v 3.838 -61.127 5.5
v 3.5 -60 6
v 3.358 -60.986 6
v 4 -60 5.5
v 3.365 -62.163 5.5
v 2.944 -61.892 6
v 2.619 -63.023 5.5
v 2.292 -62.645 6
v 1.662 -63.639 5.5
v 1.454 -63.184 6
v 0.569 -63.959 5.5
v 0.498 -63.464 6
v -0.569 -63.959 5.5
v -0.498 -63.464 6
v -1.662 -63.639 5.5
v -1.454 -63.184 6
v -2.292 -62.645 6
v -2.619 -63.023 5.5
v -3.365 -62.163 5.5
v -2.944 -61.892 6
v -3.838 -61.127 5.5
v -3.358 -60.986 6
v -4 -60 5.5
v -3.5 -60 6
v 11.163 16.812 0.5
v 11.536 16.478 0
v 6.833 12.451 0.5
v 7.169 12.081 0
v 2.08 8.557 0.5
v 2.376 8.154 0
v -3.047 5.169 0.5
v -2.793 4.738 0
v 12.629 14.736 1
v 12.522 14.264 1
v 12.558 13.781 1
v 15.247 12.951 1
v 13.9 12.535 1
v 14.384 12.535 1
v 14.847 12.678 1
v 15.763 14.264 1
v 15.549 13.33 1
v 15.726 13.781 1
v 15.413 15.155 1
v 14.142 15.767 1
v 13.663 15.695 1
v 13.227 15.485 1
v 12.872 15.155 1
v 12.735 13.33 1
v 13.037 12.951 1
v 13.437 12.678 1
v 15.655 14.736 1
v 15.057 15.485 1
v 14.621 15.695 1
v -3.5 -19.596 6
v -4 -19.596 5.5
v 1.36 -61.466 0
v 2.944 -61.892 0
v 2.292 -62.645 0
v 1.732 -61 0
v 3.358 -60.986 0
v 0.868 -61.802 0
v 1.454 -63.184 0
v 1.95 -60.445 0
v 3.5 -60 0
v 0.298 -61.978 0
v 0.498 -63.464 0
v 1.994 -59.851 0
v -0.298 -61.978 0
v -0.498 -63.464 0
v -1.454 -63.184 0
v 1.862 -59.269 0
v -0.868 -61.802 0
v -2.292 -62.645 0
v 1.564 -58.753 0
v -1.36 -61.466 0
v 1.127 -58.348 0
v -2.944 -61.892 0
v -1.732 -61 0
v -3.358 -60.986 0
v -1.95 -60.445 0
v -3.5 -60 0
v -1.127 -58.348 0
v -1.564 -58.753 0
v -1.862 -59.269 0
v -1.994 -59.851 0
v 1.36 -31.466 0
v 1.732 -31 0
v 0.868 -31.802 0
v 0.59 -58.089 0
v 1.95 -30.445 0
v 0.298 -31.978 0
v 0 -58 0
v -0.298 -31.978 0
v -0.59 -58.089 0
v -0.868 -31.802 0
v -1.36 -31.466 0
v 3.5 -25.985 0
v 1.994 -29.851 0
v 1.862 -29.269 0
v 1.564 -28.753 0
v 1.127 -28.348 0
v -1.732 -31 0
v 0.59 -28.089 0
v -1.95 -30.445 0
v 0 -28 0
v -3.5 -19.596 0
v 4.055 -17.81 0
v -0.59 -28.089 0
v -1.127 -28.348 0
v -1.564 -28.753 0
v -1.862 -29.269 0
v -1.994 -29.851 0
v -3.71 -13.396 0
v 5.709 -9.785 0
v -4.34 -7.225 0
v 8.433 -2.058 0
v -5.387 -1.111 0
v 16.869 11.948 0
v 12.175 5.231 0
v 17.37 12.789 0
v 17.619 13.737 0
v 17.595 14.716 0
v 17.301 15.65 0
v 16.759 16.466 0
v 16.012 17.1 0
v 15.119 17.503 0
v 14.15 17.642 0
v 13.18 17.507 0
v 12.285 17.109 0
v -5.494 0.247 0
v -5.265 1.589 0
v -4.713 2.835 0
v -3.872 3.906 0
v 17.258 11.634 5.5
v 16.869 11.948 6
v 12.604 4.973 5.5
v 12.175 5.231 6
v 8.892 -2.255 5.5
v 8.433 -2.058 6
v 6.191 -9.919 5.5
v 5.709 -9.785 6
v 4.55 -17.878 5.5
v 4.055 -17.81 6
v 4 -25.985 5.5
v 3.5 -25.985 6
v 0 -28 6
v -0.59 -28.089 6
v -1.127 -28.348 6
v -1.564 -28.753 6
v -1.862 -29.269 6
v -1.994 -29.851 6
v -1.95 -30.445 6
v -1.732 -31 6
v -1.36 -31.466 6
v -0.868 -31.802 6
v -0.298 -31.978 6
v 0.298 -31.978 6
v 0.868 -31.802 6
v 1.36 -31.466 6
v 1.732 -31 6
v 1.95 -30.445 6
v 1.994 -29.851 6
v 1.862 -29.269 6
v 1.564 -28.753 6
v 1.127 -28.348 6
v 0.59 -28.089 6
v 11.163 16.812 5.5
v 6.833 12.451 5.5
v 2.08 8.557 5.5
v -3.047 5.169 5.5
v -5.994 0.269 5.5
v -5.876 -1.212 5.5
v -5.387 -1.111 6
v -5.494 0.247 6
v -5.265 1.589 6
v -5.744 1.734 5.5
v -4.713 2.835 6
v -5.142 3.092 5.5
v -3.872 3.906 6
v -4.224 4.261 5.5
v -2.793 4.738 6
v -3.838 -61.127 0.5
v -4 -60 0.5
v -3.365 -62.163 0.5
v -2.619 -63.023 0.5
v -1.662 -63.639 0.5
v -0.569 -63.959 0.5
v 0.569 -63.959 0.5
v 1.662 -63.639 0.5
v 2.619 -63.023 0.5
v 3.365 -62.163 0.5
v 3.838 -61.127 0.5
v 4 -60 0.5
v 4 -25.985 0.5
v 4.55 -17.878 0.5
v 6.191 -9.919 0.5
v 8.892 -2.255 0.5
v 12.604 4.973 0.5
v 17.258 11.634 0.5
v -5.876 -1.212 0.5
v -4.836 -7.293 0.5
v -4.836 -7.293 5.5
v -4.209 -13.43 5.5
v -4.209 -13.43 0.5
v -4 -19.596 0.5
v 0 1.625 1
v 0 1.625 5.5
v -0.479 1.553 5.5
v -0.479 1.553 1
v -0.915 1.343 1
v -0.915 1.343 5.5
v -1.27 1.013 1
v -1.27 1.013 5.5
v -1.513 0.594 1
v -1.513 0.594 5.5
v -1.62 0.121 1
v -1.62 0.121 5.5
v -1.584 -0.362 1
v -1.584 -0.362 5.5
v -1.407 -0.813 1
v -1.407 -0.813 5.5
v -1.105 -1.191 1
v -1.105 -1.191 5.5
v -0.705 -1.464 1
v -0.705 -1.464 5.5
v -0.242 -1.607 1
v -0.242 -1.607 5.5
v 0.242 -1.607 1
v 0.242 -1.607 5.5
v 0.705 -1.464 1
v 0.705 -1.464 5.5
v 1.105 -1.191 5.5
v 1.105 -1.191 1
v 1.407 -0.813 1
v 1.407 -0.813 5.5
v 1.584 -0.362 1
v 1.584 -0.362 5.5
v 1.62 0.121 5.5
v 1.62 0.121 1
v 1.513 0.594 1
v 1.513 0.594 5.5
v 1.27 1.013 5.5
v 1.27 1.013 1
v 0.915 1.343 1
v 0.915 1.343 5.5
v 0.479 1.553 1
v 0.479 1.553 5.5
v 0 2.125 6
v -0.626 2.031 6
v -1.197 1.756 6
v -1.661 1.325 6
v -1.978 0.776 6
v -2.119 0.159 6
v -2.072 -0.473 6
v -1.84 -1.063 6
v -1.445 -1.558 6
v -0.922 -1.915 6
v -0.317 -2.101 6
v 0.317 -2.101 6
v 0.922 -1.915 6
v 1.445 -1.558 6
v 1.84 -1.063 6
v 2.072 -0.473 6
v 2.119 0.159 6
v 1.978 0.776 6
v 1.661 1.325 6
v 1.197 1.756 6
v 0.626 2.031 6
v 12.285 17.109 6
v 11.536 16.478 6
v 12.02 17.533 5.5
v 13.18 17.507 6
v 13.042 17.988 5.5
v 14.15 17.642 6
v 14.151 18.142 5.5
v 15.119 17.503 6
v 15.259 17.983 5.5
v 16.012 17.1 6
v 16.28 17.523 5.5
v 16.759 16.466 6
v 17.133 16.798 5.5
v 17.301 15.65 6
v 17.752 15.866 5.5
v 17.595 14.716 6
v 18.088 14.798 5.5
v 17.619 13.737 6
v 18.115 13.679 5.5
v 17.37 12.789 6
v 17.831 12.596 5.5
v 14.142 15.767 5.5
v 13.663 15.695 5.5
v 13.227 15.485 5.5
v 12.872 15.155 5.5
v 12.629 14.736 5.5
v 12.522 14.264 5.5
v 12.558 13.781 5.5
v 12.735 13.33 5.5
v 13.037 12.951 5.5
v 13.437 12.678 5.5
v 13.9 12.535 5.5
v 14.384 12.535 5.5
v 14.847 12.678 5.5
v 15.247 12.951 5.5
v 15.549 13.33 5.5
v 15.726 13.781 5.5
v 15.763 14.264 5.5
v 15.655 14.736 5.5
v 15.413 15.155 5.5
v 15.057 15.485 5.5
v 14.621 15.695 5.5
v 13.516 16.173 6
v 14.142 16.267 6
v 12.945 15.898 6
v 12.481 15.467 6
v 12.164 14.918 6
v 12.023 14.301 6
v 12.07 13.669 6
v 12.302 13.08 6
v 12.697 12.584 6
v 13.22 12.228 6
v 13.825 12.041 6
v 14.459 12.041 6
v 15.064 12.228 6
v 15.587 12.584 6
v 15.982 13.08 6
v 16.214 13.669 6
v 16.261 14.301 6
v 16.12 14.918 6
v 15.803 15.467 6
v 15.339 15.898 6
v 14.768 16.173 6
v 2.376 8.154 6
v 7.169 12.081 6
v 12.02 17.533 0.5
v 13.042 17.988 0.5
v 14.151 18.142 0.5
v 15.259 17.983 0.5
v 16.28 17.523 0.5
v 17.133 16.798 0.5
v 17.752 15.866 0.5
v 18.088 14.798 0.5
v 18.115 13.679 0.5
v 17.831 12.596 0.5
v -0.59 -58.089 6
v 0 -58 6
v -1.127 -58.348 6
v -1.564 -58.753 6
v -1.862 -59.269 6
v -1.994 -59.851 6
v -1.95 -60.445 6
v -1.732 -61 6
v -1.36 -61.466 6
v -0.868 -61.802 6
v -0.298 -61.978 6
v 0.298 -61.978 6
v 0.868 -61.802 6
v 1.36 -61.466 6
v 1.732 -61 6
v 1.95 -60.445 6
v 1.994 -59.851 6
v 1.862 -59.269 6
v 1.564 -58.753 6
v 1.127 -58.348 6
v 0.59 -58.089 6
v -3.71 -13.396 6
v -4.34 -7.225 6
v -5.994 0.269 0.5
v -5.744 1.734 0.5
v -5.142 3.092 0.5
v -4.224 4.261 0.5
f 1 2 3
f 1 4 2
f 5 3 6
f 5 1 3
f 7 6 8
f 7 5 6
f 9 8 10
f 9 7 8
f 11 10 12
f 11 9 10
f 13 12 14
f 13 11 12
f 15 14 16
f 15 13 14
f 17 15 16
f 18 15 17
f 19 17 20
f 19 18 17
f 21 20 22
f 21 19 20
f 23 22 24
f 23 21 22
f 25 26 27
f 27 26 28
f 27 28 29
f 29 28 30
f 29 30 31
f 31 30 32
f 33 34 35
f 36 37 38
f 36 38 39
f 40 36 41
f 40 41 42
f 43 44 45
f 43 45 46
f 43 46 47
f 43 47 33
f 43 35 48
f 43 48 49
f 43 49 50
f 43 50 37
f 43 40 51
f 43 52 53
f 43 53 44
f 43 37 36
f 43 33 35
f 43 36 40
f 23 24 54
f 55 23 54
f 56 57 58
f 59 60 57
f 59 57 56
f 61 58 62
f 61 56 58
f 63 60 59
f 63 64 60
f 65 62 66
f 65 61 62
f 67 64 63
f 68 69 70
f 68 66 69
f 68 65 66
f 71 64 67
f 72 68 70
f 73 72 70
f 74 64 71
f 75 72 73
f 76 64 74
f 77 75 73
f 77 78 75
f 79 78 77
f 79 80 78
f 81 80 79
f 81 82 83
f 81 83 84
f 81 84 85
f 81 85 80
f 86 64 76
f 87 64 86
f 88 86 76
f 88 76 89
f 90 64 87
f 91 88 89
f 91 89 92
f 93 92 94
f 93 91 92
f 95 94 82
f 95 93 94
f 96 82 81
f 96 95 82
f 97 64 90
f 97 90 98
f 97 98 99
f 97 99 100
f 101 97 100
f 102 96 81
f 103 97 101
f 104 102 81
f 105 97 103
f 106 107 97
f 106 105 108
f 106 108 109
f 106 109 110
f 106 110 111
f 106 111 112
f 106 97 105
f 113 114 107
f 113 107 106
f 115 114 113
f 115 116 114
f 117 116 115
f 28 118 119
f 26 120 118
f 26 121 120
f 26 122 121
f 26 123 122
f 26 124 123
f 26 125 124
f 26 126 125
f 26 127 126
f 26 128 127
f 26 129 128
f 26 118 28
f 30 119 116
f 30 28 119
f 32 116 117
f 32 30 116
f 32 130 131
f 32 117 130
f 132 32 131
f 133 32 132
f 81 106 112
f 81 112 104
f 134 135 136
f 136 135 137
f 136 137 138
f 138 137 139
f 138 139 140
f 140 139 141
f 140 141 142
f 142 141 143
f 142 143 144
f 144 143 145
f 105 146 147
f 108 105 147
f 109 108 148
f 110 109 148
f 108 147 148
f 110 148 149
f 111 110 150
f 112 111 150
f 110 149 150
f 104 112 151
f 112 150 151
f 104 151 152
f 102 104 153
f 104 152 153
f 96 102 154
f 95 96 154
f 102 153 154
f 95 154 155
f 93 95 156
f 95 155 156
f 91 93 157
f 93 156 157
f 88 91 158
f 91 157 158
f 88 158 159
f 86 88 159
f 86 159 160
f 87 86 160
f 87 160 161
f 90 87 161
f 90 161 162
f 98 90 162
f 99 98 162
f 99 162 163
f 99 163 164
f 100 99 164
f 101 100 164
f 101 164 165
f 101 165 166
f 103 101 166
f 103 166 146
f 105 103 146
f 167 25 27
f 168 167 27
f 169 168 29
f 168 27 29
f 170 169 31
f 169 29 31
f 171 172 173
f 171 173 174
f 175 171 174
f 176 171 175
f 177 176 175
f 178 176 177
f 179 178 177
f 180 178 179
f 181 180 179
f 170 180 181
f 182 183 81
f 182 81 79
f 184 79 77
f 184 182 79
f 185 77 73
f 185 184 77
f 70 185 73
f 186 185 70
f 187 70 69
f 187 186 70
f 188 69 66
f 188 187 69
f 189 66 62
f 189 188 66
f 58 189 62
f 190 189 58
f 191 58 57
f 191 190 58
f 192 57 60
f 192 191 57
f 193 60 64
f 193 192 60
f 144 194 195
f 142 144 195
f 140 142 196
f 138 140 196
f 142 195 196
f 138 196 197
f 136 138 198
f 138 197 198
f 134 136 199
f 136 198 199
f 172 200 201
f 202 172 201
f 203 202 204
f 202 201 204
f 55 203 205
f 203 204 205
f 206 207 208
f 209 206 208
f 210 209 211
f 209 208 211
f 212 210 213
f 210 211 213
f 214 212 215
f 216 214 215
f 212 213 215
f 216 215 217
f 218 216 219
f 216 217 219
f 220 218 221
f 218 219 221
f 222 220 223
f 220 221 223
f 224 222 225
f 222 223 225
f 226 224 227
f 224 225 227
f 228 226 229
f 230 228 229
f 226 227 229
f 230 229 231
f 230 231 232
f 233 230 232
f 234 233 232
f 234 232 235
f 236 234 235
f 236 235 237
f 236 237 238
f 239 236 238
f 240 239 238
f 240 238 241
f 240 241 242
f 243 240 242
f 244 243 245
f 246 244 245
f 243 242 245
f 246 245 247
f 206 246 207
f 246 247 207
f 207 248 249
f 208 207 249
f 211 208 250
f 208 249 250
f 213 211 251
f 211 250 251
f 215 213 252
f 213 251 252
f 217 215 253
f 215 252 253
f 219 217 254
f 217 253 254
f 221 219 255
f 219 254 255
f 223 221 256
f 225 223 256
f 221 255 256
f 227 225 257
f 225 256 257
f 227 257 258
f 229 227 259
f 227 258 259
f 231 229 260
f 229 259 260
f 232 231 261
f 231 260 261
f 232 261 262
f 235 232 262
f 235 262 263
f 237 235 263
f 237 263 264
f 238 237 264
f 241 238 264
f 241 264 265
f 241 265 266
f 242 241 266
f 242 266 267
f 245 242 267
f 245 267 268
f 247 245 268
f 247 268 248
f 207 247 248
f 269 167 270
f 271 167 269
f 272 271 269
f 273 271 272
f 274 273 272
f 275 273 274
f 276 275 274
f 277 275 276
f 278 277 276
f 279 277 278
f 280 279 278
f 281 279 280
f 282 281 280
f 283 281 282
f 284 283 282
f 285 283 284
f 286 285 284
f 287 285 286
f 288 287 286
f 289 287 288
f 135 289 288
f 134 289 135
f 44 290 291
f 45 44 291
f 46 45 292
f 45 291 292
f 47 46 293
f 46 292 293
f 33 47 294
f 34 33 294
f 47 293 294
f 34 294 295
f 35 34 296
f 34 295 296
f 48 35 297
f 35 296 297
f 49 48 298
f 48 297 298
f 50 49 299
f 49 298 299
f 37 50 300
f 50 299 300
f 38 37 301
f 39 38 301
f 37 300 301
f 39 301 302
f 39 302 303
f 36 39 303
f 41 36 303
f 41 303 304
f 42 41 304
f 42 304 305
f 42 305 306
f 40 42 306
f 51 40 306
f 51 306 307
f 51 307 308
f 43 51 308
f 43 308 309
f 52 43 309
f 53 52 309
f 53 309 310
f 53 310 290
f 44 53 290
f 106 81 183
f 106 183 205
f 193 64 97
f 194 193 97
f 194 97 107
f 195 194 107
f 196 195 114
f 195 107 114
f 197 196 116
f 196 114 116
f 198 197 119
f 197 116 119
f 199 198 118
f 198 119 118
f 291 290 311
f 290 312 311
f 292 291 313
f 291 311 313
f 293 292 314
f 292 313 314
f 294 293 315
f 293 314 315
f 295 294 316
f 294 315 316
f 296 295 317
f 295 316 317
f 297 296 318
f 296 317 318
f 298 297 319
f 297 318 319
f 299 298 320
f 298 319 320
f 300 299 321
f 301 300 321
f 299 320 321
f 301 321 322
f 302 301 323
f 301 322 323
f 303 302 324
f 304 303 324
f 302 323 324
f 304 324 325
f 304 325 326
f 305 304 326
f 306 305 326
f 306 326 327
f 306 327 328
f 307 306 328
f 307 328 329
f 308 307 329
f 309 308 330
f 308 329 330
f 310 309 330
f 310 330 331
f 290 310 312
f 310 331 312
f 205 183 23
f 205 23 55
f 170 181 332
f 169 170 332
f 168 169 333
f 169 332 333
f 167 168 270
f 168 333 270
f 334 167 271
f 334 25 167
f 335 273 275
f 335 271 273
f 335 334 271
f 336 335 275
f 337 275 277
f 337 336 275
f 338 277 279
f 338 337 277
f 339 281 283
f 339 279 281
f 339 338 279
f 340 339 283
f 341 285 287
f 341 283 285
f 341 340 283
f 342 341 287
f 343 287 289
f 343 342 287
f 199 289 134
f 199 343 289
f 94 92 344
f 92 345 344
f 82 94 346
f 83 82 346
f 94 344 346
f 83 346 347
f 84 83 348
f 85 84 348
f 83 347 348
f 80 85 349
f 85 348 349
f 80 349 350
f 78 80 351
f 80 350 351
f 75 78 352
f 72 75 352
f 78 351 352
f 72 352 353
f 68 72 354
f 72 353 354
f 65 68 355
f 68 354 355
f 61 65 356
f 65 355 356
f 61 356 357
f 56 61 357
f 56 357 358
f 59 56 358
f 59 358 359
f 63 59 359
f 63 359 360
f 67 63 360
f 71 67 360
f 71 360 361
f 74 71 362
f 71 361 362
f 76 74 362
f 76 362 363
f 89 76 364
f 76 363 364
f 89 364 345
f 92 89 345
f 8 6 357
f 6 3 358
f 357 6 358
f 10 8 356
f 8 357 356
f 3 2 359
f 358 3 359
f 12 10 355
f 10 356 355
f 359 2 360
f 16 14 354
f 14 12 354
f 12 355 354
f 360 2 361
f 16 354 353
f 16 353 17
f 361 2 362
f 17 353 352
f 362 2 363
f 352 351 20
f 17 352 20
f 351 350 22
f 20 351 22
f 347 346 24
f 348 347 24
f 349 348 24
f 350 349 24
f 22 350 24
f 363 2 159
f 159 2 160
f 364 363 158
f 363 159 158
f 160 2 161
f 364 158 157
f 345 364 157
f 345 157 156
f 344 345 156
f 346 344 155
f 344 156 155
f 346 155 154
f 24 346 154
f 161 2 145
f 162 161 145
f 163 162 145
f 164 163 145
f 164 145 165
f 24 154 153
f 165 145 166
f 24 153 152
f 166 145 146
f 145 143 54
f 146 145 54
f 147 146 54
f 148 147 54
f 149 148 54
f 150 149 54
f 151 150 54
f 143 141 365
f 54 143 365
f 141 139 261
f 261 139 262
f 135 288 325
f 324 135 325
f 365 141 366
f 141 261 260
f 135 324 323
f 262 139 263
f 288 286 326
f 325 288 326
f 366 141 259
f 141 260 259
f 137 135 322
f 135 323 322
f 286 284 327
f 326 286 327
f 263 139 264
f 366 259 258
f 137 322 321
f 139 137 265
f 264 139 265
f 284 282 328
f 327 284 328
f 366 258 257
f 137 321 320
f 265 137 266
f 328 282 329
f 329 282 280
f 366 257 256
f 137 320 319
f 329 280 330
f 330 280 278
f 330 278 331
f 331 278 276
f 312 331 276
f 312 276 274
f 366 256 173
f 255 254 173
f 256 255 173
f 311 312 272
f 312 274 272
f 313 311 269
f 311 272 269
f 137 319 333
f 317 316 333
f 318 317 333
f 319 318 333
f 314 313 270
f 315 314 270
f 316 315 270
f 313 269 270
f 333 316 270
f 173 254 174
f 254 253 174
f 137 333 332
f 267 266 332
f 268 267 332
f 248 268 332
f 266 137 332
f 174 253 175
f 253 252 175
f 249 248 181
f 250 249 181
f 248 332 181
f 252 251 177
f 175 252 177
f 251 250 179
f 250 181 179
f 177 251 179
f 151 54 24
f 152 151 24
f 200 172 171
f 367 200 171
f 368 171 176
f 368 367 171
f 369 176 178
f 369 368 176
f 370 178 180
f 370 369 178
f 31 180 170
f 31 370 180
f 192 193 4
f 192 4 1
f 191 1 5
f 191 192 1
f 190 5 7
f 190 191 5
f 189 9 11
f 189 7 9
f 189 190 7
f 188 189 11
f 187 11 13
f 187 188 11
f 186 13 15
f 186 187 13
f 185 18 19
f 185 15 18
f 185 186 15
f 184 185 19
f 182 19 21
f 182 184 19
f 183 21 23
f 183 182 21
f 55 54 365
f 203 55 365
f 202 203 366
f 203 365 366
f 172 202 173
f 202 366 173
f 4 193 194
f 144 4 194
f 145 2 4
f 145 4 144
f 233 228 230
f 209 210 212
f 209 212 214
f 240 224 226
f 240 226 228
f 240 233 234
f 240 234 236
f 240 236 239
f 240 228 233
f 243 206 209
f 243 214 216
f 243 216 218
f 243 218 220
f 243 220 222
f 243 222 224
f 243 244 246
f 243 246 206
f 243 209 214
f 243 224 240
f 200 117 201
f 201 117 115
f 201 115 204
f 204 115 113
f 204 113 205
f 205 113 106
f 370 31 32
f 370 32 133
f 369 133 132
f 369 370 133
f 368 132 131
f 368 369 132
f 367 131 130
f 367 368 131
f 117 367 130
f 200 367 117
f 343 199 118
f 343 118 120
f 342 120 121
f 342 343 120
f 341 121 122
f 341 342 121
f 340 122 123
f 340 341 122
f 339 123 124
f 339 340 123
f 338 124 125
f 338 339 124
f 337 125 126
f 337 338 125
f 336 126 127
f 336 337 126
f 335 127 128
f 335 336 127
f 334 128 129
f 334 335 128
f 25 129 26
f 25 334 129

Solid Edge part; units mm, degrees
sketch "Sketch1" plane through (0, 0, 0) normal (0, 0, 1) x (1, 0, 0)
  arc A0 (17.2583, 11.6342) -> (4, -25.9851) centre (64, -25.9851) ccw
  line L0 (4, -60) -> (4, -25.9851)
  line L1 (-4, -60) -> (-4, -19.5959)
  arc A1 (-4, -19.5959) -> (-5.8763, -1.2121) centre (-95, -19.5959) ccw
  arc A2 (11.1633, 16.8117) -> (-3.0473, 5.1686) centre (-33.5198, 56.8544) cw
  arc A3 (4, -60) -> (-4, -60) centre (0, -60) cw
  arc A4 (-5.8763, -1.2121) -> (-3.0473, 5.1686) centre (0, 0) cw
  arc A5 (11.1633, 16.8117) -> (17.2583, 11.6342) centre (14.1421, 14.1421) cw
extrude "Protrusion1" add sketch "Sketch1" along normal blind 6
sketch "Sketch2" plane through (7.8388, -21.1612, 6) normal (0, 0, 1) x (0, 1, 0)
  circle A0 centre (21.1612, 7.8388) radius 1.625
  circle A1 centre (35.3033, -6.3033) radius 1.625
  dimension "D1" = 3.25
  dimension "D2" = 3.25
extrude "VaciadoExtruido_1" cut sketch "Sketch2" against normal blind 5
sketch "Sketch3" plane through (7.8388, -21.1612, 6) normal (0, 0, 1) x (0, 1, 0)
  circle A0 centre (-38.8388, 7.8388) radius 2
  circle A1 centre (-8.8388, 7.8388) radius 2
  dimension "D1" = 4
  dimension "D2" = 4
  dimension "D3" = 30
extrude "Cutout1" cut sketch "Sketch3" against normal through all
chamfer "Chaflán_1" distance 0.5 angle 45 18 edges at (4, -42.9925, 6) (0, -64, 6) (-4, -39.798, 6) (-4.4703, -10.3563, 6) (-5.485, 2.4319, 6) (4.5063, 10.443, 6) (16.7318, 17.1907, 6) (7.4116, -6.0415, 6) (4, -42.9925, 0) (0, -64, 0) (-4, -39.798, 0) (-4.4703, -10.3563, 0) (-5.485, 2.4319, 0) (4.5063, 10.443, 0) (16.7318, 17.1907, 0) (7.4116, -6.0415, 0) (0, -1.625, 6) (14.1421, 12.5171, 6)
